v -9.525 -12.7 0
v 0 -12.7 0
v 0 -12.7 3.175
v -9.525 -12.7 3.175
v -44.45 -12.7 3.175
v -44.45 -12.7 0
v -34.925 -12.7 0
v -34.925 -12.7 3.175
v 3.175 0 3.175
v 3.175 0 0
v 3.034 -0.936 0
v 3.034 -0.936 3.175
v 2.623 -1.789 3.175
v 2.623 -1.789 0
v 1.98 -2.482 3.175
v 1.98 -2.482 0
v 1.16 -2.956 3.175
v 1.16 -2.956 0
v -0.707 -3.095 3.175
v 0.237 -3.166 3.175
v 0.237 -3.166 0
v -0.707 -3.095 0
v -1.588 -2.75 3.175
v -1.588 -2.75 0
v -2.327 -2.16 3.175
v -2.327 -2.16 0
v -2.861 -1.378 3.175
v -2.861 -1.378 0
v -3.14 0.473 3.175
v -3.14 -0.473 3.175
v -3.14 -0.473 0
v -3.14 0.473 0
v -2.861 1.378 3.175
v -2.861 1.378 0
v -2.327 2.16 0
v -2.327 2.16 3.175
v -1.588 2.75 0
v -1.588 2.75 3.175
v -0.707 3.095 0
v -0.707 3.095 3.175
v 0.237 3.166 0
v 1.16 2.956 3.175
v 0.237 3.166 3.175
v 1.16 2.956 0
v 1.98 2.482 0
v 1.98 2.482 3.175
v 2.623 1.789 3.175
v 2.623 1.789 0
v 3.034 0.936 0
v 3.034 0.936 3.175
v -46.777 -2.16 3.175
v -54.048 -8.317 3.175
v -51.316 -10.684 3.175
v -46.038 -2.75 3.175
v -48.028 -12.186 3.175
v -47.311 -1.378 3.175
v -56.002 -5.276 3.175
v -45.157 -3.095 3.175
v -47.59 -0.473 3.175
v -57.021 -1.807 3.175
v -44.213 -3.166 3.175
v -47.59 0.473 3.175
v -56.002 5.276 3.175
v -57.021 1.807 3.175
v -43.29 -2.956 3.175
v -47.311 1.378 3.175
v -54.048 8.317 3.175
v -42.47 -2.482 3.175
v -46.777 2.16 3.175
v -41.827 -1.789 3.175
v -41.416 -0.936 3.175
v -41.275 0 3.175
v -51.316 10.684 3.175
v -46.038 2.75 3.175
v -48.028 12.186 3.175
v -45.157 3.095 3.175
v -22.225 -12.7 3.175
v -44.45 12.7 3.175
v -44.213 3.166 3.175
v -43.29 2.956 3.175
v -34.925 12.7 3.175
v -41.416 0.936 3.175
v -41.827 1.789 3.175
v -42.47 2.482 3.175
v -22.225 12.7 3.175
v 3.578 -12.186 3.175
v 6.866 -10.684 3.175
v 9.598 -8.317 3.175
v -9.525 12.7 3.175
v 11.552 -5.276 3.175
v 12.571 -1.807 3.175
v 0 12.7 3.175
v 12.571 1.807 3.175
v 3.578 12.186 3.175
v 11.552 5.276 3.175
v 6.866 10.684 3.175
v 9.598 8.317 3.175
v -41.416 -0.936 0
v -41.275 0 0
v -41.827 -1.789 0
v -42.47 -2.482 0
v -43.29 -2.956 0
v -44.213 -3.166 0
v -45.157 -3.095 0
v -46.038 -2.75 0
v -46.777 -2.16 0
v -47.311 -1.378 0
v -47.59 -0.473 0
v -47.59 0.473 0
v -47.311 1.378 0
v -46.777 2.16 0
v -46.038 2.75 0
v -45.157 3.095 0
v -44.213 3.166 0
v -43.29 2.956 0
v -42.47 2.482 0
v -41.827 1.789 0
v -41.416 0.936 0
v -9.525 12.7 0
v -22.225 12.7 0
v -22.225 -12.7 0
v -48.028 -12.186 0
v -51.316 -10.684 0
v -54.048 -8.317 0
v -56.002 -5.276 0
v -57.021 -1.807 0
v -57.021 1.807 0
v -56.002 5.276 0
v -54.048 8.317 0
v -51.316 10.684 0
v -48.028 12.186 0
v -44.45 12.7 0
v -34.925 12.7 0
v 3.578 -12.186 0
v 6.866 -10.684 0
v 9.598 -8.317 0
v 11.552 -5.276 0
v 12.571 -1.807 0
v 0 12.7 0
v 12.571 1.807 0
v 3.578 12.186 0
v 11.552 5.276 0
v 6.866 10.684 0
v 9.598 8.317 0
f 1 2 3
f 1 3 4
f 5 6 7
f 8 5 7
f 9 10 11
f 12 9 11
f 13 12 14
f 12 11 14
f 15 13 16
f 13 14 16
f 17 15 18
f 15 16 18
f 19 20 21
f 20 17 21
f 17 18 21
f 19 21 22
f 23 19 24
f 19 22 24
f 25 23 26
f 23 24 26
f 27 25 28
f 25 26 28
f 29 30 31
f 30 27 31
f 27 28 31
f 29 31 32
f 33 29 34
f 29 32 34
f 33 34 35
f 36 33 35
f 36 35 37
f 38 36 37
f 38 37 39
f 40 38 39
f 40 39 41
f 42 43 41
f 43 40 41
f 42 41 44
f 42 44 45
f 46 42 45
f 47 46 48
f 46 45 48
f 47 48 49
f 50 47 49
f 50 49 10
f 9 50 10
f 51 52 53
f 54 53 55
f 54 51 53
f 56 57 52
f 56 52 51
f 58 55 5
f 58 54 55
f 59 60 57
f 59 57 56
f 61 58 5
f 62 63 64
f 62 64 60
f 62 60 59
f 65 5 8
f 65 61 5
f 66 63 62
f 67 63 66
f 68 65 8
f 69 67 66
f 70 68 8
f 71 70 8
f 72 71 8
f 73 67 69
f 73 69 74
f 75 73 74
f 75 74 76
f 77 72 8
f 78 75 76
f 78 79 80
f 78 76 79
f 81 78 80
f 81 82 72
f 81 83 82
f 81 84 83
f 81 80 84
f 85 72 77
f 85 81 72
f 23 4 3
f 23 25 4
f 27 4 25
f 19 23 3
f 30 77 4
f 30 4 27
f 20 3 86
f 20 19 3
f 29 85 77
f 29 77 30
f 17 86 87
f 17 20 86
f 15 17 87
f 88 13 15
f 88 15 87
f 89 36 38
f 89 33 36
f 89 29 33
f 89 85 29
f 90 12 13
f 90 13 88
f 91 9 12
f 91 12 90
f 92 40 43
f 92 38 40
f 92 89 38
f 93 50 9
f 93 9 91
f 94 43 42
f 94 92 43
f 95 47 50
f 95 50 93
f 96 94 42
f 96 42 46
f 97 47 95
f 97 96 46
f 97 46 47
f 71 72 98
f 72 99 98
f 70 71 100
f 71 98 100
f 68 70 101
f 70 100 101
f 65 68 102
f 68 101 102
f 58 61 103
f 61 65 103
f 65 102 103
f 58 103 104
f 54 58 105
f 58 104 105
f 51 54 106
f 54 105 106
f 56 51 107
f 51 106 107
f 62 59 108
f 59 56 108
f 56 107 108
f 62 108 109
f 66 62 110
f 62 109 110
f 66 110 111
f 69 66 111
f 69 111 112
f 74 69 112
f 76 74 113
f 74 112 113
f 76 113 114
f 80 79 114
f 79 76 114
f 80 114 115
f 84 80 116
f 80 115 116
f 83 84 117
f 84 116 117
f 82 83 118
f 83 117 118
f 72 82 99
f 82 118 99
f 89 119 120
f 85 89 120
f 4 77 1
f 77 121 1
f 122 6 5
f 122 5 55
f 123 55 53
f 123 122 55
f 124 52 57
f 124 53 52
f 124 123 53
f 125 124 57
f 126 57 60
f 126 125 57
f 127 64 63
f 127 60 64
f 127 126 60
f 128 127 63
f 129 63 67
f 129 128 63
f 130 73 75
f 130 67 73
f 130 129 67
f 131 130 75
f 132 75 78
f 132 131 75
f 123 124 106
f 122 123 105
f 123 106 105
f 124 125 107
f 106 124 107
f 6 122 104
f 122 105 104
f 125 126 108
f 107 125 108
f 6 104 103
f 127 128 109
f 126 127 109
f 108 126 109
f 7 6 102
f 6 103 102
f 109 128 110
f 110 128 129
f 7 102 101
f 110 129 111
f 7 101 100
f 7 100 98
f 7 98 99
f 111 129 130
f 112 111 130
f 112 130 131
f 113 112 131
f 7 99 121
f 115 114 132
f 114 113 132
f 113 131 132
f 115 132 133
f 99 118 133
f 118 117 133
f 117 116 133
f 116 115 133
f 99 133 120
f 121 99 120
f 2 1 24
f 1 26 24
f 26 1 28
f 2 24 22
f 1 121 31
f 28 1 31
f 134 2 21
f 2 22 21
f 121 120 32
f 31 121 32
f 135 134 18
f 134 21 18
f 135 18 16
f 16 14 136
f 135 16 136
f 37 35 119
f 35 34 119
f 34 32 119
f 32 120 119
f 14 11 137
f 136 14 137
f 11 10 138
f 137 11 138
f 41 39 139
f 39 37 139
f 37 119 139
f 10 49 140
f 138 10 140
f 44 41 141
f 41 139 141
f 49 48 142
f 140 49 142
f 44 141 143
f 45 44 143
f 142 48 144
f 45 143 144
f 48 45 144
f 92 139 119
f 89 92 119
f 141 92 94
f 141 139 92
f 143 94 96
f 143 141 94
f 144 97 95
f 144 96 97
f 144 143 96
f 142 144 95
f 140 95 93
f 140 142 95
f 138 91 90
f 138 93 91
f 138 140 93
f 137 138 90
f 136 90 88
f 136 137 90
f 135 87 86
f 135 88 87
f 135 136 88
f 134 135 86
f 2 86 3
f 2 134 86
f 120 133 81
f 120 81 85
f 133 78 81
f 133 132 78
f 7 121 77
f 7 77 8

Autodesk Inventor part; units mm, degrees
ref_plane "YZ Plane" through (0, 0, 0) normal (1, 0, 0) x (0, 1, 0)
ref_plane "XZ Plane" through (0, 0, 0) normal (0, 1, 0) x (-1, 0, 0)
ref_plane "XY Plane" through (0, 0, 0) normal (0, 0, 1) x (1, 0, 0)
sketch "Sketch1" plane through (0, 0, 0) normal (0, 0, 1) x (1, 0, 0)
  circle A0 centre (0, 0) radius 3.175
  arc A1 (0, -12.7) -> (0, 12.7) centre (0, 0) ccw
  line L0 (0, 12.7) -> (-9.525, 12.7)
  line L1 (0, -12.7) -> (-9.525, -12.7)
  line L2 (-9.525, 12.7) -> (-22.225, 12.7)
  line L3 (-22.225, -12.7) -> (-9.525, -12.7)
  line L4 (-22.225, 12.7) -> (0, 12.7)
  line L5 (0, -12.7) -> (-22.225, -12.7)
  circle A2 centre (-44.45, 0) radius 3.175
  arc A3 (-44.45, 12.7) -> (-44.45, -12.7) centre (-44.45, 0) ccw
  line L6 (-44.45, 12.7) -> (-34.925, 12.7)
  line L7 (-44.45, -12.7) -> (-34.925, -12.7)
  line L8 (-34.925, 12.7) -> (-22.225, 12.7)
  line L9 (-22.225, -12.7) -> (-34.925, -12.7)
  line L10 (-22.225, 12.7) -> (-44.45, 12.7)
  line L11 (-44.45, -12.7) -> (-22.225, -12.7)
  dimension "d0" = 6.35
  dimension "d5" = 25.4
  dimension "d6" = 12.7
extrude "Extrusion1" add sketch "Sketch1" along normal blind 3.175
properties part number "linear_slide_piece2_v2" material "Aluminum 6061"
